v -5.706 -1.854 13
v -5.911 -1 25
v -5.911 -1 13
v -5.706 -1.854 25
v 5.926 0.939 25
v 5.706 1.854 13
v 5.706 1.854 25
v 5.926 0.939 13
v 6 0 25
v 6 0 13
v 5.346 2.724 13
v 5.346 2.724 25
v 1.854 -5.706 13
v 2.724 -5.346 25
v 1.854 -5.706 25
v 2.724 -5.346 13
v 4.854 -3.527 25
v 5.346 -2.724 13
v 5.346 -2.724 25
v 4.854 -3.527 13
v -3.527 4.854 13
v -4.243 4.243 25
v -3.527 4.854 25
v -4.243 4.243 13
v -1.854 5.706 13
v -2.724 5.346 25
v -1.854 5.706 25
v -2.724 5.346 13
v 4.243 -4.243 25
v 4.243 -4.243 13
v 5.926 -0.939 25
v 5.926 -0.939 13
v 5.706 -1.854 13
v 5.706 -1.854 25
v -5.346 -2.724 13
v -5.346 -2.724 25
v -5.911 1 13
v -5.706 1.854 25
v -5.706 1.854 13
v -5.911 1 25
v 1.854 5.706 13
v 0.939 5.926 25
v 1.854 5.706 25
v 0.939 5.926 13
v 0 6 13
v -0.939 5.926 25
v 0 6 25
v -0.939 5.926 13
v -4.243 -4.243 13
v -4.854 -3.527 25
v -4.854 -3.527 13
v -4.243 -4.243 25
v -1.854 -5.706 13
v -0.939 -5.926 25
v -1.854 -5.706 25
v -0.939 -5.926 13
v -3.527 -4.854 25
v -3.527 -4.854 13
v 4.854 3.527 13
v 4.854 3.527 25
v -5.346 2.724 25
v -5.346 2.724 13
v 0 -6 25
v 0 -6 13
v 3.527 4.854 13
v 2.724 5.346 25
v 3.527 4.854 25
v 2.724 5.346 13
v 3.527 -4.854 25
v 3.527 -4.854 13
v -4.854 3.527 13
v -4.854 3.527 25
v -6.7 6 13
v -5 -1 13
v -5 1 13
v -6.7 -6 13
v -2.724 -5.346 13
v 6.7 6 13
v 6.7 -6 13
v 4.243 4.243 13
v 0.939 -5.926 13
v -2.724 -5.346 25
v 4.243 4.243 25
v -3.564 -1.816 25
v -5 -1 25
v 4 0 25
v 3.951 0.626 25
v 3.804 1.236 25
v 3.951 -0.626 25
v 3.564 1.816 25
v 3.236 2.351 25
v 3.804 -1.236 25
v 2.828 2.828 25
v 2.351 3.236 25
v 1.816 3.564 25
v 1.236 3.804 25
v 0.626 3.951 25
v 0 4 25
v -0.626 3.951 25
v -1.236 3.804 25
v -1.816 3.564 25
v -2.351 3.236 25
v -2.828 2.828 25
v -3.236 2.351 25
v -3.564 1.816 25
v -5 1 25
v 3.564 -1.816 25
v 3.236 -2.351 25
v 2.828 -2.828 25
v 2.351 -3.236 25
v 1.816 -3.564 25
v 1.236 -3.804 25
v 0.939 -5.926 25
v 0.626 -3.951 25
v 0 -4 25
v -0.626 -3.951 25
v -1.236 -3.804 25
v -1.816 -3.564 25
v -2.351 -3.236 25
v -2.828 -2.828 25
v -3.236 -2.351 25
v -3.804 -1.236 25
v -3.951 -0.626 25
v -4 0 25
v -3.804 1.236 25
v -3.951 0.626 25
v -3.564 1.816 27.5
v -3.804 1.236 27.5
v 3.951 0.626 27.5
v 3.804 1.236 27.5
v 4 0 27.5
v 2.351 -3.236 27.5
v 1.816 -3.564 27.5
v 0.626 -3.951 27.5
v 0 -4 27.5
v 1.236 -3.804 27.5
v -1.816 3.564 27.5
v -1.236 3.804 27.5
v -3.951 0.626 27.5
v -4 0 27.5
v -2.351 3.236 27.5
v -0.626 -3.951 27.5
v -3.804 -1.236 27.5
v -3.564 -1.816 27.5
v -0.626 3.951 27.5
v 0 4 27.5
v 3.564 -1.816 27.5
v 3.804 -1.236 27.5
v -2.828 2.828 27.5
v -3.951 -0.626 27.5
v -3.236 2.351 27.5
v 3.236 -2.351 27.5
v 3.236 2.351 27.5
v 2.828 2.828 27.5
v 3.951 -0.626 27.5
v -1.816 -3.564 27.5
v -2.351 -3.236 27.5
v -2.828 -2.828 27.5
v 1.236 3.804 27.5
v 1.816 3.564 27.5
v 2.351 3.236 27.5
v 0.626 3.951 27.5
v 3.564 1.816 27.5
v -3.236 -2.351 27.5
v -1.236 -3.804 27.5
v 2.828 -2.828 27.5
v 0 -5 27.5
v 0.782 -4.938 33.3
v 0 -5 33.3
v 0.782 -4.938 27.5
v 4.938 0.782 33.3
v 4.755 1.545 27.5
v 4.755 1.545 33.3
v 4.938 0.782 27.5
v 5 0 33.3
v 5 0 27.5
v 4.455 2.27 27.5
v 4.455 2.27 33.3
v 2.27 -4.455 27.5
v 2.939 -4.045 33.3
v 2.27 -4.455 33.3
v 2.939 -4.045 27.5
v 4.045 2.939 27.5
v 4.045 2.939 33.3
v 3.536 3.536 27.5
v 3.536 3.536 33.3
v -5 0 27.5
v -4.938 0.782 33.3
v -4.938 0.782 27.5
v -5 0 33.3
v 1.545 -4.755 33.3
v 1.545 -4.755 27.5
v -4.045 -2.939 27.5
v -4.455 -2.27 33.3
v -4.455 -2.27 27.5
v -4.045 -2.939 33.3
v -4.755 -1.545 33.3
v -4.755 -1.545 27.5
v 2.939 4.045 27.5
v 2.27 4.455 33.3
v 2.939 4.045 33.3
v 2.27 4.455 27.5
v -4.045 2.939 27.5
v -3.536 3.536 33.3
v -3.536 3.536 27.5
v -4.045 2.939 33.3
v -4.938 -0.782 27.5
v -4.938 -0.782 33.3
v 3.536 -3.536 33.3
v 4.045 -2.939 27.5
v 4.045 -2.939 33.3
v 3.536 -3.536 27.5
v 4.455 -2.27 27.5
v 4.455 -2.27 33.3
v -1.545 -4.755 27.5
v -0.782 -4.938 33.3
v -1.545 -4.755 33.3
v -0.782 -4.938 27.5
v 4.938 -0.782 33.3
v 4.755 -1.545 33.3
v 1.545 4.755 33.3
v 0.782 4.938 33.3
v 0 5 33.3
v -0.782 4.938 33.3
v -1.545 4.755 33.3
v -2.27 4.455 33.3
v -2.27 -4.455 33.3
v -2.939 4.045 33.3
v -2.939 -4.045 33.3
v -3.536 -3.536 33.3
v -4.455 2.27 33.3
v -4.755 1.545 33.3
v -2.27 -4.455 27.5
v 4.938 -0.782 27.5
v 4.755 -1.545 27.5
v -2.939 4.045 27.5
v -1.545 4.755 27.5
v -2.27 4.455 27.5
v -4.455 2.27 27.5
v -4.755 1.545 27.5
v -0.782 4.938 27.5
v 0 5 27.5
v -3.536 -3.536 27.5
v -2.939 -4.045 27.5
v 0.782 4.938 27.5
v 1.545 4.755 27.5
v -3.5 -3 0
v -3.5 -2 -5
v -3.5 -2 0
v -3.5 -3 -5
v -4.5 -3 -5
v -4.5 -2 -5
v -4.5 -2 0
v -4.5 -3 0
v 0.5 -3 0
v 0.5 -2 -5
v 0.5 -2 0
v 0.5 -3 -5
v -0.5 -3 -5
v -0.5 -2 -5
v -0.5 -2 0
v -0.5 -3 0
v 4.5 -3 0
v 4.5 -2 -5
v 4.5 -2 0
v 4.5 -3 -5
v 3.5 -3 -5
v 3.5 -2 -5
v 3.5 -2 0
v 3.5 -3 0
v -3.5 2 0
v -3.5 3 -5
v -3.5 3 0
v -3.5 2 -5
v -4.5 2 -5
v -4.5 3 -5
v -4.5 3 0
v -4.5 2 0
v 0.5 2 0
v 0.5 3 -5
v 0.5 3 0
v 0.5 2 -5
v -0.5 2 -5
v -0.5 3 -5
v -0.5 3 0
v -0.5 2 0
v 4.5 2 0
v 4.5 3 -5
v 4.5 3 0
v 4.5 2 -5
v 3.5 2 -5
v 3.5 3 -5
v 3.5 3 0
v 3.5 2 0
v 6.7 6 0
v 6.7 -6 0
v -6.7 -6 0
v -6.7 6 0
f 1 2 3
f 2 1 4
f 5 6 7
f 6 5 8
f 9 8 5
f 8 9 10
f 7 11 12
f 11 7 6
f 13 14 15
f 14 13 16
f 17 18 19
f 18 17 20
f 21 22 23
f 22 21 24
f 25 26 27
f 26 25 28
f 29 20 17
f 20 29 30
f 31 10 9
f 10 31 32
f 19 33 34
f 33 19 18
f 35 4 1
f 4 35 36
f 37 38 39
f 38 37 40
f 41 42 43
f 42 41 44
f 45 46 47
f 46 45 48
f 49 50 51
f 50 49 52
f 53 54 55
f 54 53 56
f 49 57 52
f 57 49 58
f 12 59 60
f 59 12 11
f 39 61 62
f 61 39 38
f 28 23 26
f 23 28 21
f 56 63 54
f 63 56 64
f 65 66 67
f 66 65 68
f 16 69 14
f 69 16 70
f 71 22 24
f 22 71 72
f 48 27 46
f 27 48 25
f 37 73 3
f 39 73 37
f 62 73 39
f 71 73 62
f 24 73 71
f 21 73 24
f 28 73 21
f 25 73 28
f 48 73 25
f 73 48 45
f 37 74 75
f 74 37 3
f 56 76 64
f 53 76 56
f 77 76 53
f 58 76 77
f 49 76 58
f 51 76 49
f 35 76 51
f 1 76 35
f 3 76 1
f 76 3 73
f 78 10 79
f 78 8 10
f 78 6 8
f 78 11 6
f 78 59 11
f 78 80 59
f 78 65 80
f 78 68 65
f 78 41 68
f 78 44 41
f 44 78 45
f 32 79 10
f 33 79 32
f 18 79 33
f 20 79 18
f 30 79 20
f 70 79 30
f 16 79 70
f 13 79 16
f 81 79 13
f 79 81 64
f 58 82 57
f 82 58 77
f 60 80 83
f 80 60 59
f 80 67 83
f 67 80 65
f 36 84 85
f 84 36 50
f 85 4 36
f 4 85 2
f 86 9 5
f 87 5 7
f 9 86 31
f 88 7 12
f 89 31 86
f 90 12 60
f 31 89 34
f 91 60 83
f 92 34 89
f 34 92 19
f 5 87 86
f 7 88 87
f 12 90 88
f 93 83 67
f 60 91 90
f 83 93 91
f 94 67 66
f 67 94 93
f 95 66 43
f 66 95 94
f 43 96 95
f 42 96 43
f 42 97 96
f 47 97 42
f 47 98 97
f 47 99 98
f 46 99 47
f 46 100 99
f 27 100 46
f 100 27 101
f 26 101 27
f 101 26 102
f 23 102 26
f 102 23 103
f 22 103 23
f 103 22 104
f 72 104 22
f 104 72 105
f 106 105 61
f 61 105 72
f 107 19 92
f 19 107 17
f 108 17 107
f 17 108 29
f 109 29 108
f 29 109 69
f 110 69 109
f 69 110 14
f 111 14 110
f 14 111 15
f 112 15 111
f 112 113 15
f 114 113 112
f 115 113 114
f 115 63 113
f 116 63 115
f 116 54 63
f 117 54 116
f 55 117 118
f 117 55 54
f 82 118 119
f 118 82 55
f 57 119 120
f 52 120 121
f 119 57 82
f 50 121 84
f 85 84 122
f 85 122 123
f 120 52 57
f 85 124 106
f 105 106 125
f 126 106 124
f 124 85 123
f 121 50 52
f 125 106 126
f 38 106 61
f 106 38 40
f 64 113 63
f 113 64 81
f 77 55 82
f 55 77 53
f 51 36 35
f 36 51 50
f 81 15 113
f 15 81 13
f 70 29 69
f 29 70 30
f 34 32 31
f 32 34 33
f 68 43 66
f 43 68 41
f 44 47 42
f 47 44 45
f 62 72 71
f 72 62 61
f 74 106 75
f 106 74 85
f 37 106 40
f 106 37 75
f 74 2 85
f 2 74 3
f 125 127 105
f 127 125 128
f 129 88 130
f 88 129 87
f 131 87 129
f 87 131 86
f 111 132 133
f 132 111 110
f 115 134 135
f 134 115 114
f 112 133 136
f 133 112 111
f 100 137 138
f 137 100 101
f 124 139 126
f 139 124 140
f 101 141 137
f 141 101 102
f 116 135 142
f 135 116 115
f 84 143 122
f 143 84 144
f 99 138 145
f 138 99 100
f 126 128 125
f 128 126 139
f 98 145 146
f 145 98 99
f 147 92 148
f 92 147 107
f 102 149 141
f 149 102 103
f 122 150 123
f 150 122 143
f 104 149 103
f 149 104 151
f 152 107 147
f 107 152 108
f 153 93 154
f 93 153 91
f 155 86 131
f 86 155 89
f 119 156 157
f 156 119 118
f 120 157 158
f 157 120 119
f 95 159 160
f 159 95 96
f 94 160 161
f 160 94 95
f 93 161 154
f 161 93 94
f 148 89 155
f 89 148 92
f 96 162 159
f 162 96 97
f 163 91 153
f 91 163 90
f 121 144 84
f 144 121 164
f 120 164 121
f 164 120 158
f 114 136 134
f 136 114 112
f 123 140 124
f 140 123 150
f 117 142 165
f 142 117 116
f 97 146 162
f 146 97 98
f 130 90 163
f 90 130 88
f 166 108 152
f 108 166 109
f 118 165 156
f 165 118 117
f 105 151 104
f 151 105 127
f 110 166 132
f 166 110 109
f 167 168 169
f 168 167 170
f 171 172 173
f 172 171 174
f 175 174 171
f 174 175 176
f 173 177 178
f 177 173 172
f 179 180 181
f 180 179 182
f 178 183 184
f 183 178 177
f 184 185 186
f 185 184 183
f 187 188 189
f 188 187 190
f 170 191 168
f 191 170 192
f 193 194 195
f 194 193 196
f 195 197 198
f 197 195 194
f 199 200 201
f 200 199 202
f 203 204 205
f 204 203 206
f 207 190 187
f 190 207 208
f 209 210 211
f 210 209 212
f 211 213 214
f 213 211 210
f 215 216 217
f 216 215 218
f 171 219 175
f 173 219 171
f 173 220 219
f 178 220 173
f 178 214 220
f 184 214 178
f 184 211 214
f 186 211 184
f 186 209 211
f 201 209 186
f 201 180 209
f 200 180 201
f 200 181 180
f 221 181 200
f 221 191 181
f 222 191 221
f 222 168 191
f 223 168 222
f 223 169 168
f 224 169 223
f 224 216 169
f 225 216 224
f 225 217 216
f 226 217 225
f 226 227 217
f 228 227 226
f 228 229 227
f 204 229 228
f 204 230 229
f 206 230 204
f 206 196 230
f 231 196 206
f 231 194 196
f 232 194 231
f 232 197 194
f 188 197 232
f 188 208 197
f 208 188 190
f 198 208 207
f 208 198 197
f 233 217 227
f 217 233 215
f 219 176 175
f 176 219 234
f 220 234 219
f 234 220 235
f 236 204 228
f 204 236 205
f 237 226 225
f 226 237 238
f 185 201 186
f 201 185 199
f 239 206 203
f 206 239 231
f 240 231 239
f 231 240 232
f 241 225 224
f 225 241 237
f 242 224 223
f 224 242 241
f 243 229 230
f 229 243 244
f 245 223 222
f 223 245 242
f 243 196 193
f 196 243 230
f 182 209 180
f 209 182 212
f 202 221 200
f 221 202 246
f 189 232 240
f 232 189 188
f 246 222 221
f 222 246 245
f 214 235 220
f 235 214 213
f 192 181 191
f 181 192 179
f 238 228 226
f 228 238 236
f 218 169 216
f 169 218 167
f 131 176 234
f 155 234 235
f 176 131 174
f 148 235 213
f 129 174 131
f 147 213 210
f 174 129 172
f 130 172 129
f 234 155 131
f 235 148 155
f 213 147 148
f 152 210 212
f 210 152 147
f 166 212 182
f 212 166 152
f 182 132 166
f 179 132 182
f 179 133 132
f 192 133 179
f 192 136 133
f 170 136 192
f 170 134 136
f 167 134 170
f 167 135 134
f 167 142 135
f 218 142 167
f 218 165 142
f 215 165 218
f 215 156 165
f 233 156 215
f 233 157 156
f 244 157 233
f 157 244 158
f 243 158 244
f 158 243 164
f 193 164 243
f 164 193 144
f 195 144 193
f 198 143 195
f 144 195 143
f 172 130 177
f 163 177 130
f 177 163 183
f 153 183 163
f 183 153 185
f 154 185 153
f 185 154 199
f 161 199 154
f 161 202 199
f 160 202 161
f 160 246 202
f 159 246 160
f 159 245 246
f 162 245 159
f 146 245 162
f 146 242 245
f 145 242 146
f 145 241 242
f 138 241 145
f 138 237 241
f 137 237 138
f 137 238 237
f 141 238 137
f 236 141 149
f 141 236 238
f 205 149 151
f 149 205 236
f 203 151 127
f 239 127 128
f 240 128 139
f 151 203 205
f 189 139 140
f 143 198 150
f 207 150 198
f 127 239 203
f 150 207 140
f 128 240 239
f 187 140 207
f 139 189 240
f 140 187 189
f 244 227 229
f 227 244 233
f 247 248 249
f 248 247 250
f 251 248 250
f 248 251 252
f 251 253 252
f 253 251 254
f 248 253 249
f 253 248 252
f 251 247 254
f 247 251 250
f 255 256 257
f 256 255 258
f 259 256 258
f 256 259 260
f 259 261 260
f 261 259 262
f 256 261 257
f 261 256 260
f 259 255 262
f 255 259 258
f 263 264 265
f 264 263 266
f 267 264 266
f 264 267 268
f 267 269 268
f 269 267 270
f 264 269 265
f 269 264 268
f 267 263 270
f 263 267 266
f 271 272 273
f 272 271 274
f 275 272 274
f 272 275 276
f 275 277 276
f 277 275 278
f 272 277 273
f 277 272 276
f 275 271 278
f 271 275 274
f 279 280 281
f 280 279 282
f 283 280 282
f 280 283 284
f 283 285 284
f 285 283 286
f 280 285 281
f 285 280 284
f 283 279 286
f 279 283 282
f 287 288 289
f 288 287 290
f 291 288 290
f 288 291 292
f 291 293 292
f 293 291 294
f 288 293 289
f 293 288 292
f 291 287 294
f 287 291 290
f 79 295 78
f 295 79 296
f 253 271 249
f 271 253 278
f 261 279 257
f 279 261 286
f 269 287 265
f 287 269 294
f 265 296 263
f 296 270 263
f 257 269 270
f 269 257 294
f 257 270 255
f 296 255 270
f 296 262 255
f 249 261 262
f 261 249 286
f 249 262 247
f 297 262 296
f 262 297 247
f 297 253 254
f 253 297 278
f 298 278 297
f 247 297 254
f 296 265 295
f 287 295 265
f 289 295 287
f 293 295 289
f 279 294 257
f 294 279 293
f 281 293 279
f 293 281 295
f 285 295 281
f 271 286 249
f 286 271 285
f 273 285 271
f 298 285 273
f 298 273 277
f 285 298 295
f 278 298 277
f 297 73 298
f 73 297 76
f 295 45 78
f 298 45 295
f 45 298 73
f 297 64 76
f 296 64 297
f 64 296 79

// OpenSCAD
$fn=40;

red = [0.8,0.2,0.2];
black = [0.2,0.2,0.2];
silver = [0.75,0.75,0.75];
epsilon = 0.001;

// The model is centered
pins = [ [ -4, -2.5], [0, -2.5], [4, -2.5],
         [ -4,  2.5], [0,  2.5], [4,  2.5] ];

module base()
{
    color(red) translate([0,0,6.5])
	cube([13.4, 12, 13], center=true);
}

module body()
{
    difference() {
	translate([0,0,13])
	    cylinder(12, d=12);
	translate([-6,-1,13])
	    cube([1,2,12+epsilon]);
    }
}

module switch()
{
    translate([0,0,25])
	cylinder(3, d=8);
    translate([0,0,27.5])
	cylinder(5.8, d=10);
}

color(red) base();
color(silver) body();
color(silver) switch();

// Pins
color(silver) for (pos = pins)
	translate(pos) translate([0,0,-2]) cube([1,1,6], center=true);
